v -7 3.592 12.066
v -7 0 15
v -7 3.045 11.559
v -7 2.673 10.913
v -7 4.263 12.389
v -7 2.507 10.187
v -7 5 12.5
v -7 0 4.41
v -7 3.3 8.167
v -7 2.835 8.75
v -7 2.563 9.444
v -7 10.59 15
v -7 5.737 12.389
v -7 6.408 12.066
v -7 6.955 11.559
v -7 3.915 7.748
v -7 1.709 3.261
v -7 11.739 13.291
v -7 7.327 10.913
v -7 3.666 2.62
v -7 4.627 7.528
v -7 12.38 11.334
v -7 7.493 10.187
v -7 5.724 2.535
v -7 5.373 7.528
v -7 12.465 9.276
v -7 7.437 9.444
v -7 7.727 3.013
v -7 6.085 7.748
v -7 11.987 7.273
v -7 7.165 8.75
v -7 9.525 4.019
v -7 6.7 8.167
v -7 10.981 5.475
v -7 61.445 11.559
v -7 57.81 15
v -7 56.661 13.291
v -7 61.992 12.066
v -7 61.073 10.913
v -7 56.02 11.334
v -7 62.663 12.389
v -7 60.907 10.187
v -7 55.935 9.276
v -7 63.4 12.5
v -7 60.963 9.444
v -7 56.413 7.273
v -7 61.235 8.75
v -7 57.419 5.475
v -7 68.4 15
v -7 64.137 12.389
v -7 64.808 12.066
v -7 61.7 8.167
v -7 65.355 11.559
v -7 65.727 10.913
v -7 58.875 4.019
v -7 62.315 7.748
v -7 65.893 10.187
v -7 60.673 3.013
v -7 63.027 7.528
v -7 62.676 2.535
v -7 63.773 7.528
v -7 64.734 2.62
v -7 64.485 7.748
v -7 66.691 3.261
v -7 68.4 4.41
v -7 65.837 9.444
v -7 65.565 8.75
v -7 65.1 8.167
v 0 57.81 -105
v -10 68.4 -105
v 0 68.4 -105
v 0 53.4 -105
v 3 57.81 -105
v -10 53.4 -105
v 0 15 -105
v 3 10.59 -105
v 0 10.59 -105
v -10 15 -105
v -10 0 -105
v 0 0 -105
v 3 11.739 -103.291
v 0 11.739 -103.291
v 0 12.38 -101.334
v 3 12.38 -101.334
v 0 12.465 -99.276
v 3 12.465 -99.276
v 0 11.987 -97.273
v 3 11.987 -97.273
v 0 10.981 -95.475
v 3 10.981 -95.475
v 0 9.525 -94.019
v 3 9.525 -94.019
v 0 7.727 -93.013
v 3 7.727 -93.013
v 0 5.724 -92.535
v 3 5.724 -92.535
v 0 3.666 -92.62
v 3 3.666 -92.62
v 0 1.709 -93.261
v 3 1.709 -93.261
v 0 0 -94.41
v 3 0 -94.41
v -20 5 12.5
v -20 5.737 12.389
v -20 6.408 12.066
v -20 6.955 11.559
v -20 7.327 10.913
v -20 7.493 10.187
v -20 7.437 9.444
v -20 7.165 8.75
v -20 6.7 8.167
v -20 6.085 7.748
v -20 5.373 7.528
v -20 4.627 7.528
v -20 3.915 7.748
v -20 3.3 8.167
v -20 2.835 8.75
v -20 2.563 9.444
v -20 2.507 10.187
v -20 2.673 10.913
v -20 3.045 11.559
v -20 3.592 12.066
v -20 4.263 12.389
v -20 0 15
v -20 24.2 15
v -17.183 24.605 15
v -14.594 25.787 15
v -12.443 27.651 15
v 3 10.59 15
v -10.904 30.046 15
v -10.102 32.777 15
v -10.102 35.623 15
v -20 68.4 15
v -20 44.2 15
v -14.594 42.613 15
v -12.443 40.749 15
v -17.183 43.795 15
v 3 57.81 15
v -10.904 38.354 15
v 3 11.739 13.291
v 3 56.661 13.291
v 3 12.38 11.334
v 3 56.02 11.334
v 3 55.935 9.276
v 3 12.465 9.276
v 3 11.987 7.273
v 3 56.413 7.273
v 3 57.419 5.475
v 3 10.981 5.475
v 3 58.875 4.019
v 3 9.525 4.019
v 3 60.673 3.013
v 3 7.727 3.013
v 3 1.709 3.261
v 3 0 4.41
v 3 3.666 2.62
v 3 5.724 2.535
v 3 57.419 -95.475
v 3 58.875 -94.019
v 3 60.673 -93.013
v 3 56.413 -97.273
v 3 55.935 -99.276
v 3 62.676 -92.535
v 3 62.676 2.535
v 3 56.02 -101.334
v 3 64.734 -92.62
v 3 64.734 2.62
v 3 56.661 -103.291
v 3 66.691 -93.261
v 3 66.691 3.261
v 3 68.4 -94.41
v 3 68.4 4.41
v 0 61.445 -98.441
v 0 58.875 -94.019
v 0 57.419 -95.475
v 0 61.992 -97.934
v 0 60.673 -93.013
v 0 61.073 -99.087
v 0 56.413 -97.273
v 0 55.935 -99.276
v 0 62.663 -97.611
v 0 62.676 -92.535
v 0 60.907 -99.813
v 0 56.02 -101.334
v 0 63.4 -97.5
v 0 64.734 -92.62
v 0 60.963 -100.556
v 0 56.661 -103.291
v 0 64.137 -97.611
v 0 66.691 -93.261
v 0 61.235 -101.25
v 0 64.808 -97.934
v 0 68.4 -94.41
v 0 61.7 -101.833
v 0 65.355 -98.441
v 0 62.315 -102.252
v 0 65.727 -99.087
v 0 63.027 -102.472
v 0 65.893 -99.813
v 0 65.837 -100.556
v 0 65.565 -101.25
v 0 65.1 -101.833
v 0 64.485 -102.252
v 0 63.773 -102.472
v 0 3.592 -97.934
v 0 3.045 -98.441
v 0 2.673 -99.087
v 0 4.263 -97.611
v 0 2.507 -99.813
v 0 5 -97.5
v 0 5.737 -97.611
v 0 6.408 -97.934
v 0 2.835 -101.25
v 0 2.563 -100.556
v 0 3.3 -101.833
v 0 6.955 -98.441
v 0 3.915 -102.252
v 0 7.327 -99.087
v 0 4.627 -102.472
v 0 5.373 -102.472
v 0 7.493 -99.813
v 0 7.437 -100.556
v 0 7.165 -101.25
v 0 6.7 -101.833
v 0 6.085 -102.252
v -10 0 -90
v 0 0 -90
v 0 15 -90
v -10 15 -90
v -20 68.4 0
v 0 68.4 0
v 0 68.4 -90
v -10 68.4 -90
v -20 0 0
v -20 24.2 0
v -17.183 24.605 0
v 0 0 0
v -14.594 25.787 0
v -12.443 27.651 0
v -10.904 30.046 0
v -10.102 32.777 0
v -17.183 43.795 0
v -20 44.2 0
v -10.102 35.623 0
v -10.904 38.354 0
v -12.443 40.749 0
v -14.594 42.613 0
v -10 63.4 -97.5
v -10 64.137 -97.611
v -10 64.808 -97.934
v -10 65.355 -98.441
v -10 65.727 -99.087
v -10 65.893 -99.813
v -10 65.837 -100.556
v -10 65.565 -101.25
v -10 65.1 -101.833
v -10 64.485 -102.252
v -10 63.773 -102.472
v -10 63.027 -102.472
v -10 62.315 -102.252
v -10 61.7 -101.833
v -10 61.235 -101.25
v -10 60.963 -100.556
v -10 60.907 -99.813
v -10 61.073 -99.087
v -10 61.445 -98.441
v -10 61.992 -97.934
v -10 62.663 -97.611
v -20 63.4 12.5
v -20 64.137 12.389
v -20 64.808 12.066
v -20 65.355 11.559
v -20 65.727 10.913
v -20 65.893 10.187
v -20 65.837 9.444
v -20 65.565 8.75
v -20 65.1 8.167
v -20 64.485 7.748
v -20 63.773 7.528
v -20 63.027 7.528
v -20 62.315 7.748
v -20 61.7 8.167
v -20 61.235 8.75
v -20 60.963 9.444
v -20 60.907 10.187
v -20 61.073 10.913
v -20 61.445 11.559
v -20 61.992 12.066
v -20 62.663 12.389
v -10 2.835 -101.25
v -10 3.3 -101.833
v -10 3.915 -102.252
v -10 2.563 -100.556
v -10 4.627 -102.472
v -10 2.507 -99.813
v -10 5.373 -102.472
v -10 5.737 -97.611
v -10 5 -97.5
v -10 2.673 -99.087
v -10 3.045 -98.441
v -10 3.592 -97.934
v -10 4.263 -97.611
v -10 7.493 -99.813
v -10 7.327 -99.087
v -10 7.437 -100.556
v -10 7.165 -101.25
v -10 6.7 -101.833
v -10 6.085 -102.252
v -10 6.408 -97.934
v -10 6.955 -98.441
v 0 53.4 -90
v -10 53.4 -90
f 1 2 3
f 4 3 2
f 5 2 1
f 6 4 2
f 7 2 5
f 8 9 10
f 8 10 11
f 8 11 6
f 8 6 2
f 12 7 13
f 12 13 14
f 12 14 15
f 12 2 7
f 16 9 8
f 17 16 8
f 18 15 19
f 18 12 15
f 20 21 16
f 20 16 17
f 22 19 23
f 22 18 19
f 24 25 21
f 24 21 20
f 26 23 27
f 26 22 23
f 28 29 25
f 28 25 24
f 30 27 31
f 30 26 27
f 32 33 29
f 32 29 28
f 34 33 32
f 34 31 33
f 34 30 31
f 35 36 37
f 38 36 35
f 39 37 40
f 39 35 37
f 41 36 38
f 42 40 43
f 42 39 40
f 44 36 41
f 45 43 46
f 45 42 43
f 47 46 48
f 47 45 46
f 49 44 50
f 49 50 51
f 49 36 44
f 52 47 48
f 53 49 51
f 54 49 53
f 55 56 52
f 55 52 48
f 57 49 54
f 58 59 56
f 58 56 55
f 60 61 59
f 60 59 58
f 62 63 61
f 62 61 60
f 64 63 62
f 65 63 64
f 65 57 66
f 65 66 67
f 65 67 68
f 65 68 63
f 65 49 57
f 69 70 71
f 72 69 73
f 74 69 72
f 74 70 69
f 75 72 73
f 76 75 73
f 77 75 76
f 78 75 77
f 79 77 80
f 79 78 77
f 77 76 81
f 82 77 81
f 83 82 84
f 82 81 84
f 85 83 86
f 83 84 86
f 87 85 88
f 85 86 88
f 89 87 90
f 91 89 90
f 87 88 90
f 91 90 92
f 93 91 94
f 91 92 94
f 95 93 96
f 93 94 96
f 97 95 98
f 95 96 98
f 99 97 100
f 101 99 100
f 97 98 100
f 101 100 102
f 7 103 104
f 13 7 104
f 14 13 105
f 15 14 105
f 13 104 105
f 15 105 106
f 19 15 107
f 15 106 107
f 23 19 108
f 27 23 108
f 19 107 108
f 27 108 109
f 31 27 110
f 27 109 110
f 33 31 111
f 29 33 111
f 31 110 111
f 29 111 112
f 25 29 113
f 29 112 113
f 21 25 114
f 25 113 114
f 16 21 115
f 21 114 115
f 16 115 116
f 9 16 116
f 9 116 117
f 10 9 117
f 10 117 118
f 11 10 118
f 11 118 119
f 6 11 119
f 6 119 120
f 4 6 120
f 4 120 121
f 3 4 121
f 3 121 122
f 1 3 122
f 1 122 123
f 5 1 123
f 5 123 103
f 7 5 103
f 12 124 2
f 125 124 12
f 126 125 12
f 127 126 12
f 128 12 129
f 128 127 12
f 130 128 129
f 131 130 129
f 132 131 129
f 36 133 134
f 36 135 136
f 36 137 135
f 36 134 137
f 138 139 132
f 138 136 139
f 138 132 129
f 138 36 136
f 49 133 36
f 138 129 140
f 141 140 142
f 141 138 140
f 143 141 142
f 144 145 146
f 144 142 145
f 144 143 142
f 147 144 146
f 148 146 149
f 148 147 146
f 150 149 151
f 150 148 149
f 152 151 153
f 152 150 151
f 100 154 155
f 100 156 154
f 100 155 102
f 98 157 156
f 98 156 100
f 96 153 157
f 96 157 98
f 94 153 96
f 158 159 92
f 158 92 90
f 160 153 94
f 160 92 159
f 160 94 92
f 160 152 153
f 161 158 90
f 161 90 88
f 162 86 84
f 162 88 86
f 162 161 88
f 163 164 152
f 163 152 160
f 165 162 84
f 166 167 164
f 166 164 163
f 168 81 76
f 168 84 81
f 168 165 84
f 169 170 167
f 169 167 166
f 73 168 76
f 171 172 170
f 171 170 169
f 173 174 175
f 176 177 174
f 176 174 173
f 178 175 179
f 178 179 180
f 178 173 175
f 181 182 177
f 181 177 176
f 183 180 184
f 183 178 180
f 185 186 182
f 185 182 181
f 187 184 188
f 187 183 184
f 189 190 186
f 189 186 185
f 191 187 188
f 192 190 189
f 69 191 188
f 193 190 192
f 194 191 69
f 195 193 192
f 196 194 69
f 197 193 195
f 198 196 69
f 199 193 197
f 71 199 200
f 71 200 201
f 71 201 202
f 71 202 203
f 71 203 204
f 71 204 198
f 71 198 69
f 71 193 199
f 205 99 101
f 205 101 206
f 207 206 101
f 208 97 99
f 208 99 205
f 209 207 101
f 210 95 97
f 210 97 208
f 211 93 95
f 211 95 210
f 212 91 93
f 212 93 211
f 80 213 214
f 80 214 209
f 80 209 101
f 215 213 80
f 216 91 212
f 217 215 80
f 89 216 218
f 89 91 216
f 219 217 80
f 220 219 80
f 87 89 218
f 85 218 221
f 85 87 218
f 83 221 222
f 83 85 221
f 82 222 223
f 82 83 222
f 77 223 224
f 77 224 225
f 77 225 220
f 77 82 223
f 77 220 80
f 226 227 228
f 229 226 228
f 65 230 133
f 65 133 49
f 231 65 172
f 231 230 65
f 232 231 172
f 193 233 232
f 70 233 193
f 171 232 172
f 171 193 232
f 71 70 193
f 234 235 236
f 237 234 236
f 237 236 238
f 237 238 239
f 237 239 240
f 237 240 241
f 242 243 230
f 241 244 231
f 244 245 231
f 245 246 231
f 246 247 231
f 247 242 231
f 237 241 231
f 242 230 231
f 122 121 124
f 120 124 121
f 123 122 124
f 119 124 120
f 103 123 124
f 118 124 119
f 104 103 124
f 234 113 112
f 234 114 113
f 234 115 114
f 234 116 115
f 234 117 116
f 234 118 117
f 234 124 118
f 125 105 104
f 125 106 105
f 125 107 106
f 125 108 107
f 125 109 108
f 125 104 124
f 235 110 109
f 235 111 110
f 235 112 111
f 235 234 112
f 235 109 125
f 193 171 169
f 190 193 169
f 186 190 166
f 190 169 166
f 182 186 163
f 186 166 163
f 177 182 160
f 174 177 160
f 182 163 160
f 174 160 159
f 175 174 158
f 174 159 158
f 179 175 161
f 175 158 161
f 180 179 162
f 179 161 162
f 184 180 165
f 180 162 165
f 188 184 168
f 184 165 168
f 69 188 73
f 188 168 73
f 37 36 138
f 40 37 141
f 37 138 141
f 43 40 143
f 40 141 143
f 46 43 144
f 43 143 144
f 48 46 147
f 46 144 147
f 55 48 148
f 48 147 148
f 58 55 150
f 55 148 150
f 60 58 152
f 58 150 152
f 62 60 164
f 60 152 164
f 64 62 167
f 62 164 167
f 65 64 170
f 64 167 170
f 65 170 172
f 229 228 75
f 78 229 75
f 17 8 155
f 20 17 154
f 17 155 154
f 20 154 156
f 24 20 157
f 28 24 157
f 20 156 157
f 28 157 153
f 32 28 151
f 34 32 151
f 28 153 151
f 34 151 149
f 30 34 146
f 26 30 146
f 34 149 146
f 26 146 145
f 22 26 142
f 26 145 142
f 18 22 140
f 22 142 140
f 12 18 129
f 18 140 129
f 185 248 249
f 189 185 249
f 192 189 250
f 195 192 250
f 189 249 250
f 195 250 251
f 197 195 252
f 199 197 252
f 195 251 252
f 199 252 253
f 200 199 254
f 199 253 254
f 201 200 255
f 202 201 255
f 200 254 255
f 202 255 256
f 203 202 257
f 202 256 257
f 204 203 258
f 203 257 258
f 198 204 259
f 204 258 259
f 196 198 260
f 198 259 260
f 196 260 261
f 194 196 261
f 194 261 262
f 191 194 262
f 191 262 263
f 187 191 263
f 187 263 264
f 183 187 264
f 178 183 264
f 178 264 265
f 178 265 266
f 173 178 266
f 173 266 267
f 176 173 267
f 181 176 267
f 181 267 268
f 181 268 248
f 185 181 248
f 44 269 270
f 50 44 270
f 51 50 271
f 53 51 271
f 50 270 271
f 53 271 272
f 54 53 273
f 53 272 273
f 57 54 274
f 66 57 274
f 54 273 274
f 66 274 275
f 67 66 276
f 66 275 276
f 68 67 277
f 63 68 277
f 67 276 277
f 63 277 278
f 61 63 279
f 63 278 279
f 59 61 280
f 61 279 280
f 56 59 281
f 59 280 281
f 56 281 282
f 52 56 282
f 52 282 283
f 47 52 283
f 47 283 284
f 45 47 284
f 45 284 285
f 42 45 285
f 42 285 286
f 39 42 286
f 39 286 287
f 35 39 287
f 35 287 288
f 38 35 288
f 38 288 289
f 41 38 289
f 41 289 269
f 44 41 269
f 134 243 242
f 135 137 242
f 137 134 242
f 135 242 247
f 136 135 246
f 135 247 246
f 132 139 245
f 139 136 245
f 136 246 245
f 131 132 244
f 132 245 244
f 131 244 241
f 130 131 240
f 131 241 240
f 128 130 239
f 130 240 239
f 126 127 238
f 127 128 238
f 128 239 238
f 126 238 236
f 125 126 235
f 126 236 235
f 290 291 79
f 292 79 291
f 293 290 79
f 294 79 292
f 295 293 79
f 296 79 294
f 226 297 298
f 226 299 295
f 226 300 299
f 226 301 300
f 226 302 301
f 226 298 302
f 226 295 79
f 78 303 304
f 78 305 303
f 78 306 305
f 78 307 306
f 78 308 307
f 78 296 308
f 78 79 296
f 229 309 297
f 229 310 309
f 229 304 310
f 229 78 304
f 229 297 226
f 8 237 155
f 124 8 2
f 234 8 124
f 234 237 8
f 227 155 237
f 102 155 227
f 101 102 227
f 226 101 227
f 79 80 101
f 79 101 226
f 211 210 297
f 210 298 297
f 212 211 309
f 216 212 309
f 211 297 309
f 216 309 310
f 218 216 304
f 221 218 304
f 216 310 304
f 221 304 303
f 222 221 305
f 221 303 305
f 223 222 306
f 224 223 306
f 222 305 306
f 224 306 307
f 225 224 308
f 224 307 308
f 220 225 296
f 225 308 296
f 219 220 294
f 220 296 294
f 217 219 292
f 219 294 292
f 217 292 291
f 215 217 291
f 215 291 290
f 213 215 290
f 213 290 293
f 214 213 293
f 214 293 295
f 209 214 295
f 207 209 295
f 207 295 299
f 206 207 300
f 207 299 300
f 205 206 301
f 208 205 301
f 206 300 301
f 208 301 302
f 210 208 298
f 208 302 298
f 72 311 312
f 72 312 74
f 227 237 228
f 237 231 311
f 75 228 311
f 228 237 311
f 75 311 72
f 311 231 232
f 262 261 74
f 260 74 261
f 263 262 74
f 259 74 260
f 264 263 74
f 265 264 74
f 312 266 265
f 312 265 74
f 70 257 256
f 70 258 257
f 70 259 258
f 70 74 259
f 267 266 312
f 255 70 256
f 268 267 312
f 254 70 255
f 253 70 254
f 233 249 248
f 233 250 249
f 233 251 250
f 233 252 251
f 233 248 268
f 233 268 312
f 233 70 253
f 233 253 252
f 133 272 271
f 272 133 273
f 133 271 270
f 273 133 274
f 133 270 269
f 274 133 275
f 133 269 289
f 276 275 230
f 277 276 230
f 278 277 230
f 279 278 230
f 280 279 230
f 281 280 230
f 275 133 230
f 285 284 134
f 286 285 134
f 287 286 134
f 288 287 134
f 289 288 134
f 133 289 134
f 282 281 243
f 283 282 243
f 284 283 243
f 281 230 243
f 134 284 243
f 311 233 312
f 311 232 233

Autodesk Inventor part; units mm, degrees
ref_plane "YZ Plane" through (0, 0, 0) normal (1, 0, 0) x (0, 1, 0)
ref_plane "XZ Plane" through (0, 0, 0) normal (0, 1, 0) x (-1, 0, 0)
ref_plane "XY Plane" through (0, 0, 0) normal (0, 0, 1) x (1, 0, 0)
sketch "Sketch1" plane through (0, 0, 0) normal (0, 0, 1) x (1, 0, 0)
  circle A0 centre (-20, 34.2) radius 10 construction
  line L0 (0, 0) -> (0, 68.4)
  line L1 (0, 0) -> (-20, 0)
  line L2 (-20, 0) -> (-20, 68.4) construction
  line L3 (-20, 68.4) -> (0, 68.4)
  line L4 (-20, 68.4) -> (-20, 44.2)
  line L5 (-20, 0) -> (-20, 24.2)
  arc A1 (-20, 24.2) -> (-20, 44.2) centre (-20, 34.2) ccw
  point P0 (0, 34.2)
  dimension "d0" = 20
  dimension "d1" = 20
  dimension "d3" = 68.4
extrude "Extrusion1" add sketch "Sketch1" along normal blind 15
sketch "Sketch2" plane through (0, 0, 0) normal (1, 0, 0) x (0, 0, -1)
  line L0 (-15, 68.4) -> (-15, 44.2) projected
  line L1 (-15, 68.4) -> (105, 68.4)
  line L2 (105, 68.4) -> (105, 0)
  line L3 (105, 0) -> (-15, 0)
  line L4 (-15, 0) -> (-15, 68.4)
  point P0 (0, 0)
  dimension "d6" = 120
extrude "Extrusion2" add sketch "Sketch2" along normal blind 3
sketch "Sketch3" plane through (-20, 0, 0) normal (-1, 0, 0) x (0, 0, 1)
  circle A0 centre (10, 5) radius 2.5
  circle A1 centre (10, 63.4) radius 2.5
  line L0 (0, 0) -> (15, 0) projected
  line L1 (15, 24.2) -> (15, 0) projected
  line L2 (15, 68.4) -> (15, 44.2) projected
  line L3 (0, 68.4) -> (15, 68.4) projected
  dimension "d9" = 5
  dimension "d10" = 5
  dimension "d11" = 5
  dimension "d12" = 5
  dimension "d13" = 5
  dimension "d14" = 5
extrude "Extrusion3" cut sketch "Sketch3" against normal through all
sketch "Sketch4" plane through (3, 0, 0) normal (1, 0, 0) x (0, 0, -1)
  circle A0 centre (-10, 63.4) radius 2.5 projected
  circle A1 centre (-10, 5) radius 2.5 projected
  circle A2 centre (-10, 63.4) radius 2.5 projected
  circle A3 centre (-10, 63.4) radius 7.5
  circle A4 centre (-10, 5) radius 7.5
  point P0 (0, 0)
  dimension "d18" = 15
  dimension "d19" = 15
extrude "Extrusion4" cut sketch "Sketch4" against normal blind 10 contours A0 | A1 | A3 | A4
sketch "Sketch6" plane through (0, 0, 0) normal (-1, 0, 0) x (0, 0, 1)
  line L0 (-105, 68.4) -> (4.4098, 68.4) projected
  line L1 (-105, 68.4) -> (-90, 68.4)
  line L2 (-90, 68.4) -> (-90, 53.4)
  line L3 (-90, 53.4) -> (-105, 53.4)
  line L4 (-105, 53.4) -> (-105, 68.4)
  line L5 (4.4098, 0) -> (-105, 0) projected
  line L6 (-105, 0) -> (-90, 0)
  line L7 (-90, 0) -> (-90, 15)
  line L8 (-90, 15) -> (-105, 15)
  line L9 (-105, 15) -> (-105, 0)
  point P0 (0, 0)
  dimension "d22" = 15
  dimension "d23" = 15
  dimension "d24" = 15
  dimension "d25" = 15
extrude "Extrusion5" add sketch "Sketch6" along normal blind 10
sketch "Sketch7" plane through (-10, 0, 0) normal (-1, 0, 0) x (0, 0, 1)
  circle A0 centre (-100, 63.4) radius 2.5
  circle A1 centre (-100, 5) radius 2.5
  line L0 (-90, 68.4) -> (-105, 68.4) projected
  line L1 (-105, 68.4) -> (-105, 53.4) projected
  line L2 (-105, 0) -> (-90, 0) projected
  point P0 (0, 0)
  dimension "d30" = 5
  dimension "d31" = 5
  dimension "d32" = 5
  dimension "d33" = 5
  dimension "d34" = 5
extrude "Extrusion6" cut sketch "Sketch7" against normal through all
sketch "Sketch8" plane through (3, 0, 0) normal (1, 0, 0) x (0, 0, -1)
  circle A0 centre (100, 5) radius 2.5 projected
  circle A1 centre (100, 63.4) radius 2.5 projected
  circle A2 centre (100, 5) radius 2.5 projected
  circle A3 centre (100, 5) radius 7.5
  circle A4 centre (100, 63.4) radius 7.5
  point P0 (0, 0)
  dimension "d37" = 15
  dimension "d38" = 15
extrude "Extrusion7" cut sketch "Sketch8" against normal blind 3
properties part number "BP008" material "ABS Plastic"
